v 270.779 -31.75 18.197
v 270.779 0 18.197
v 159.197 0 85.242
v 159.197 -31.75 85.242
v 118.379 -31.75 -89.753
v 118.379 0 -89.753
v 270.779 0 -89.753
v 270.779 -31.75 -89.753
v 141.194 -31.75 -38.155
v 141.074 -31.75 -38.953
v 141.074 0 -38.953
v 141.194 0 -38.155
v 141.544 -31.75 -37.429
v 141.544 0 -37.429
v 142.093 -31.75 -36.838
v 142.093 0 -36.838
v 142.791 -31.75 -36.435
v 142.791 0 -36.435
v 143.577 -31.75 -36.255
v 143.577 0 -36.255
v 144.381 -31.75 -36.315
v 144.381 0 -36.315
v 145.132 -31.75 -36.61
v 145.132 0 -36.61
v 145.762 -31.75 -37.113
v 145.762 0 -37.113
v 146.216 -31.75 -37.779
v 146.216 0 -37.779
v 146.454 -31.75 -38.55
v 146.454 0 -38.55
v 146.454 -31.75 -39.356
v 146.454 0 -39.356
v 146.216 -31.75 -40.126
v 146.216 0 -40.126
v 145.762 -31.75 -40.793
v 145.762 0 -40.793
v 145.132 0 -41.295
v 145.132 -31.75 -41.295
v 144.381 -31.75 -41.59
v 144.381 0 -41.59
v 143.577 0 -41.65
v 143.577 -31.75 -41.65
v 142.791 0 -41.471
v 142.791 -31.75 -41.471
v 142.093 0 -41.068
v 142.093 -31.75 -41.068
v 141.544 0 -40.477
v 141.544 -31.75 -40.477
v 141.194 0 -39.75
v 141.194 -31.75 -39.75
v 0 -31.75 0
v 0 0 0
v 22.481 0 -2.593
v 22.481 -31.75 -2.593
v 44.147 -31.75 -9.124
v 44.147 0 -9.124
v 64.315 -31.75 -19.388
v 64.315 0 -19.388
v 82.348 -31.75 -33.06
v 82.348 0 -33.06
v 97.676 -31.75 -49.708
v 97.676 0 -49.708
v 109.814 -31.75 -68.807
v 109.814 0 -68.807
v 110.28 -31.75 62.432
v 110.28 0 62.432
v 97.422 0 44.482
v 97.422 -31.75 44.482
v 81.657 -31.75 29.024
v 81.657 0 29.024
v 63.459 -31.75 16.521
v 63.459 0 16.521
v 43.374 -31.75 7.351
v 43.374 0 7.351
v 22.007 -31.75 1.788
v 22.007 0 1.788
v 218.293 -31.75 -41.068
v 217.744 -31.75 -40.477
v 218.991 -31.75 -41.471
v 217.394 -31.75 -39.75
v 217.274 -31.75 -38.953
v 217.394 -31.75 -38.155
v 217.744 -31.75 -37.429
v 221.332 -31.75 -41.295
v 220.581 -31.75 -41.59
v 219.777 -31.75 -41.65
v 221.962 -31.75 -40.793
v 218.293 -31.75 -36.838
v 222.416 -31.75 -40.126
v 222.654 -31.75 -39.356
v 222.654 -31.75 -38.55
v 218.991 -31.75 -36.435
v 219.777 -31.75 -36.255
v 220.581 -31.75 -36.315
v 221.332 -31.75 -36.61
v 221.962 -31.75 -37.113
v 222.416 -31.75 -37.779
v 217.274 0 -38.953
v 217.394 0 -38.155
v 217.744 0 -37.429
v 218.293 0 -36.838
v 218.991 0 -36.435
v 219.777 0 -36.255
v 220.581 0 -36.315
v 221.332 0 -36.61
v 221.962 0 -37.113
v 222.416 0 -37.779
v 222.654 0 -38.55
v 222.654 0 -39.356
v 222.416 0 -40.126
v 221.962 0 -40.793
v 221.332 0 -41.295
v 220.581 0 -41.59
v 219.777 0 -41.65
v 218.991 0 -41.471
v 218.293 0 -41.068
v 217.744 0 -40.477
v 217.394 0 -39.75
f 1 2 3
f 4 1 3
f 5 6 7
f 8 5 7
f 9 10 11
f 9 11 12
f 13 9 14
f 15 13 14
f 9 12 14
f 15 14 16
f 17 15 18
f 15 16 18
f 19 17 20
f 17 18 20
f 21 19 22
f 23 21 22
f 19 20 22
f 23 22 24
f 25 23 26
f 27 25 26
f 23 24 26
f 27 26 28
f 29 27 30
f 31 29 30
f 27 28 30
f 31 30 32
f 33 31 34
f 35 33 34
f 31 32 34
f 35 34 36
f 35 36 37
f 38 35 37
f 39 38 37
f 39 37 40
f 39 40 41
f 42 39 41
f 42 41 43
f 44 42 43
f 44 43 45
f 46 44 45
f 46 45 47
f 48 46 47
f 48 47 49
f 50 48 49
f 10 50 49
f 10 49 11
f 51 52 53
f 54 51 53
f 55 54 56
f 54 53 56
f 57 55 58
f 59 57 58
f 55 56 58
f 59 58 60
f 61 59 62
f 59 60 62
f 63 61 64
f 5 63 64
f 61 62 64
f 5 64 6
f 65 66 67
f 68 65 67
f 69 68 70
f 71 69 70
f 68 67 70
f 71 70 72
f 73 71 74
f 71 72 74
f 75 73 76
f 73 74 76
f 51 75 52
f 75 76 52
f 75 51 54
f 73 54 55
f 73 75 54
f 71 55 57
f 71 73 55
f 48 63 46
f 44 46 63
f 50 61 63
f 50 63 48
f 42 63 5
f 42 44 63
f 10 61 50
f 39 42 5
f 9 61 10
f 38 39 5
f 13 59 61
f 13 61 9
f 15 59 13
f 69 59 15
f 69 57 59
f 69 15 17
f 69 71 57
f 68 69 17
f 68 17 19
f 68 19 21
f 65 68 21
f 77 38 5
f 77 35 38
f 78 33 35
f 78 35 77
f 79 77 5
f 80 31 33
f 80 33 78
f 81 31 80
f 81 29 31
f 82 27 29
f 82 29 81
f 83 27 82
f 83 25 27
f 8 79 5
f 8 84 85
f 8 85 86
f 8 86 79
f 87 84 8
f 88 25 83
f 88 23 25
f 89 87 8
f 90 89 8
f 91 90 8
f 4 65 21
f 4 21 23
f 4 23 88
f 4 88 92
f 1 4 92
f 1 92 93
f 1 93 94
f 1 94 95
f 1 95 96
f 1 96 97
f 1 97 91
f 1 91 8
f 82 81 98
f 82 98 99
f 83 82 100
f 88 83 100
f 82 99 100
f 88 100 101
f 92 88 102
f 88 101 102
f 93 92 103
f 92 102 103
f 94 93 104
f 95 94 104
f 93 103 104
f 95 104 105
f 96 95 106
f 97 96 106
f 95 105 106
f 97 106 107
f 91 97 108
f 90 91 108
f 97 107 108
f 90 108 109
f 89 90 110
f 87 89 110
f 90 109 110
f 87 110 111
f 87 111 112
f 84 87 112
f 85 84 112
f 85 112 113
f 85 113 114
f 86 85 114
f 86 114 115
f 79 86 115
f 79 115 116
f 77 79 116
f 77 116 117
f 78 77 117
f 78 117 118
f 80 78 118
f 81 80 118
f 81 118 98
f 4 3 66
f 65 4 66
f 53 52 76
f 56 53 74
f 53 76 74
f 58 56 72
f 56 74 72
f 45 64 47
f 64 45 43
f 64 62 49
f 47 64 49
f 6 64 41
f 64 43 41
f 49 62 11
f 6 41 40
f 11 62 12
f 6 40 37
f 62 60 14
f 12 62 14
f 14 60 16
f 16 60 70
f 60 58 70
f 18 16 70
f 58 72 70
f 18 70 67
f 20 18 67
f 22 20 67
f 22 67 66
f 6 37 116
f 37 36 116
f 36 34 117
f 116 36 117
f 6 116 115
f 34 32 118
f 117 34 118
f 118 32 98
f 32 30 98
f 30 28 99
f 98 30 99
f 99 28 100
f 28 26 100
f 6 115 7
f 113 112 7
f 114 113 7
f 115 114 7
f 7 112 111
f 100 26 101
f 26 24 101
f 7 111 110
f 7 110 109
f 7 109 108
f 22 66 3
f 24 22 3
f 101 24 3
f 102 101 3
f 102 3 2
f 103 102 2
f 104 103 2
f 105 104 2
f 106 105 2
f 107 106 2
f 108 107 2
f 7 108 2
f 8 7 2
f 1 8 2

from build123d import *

# Parameters (mm, degrees)
F1_DEPTH = 31.75
F3_D     = 5.4102


with BuildPart() as f1:
    # F0 (on Front) → F1 (new body)
    with BuildSketch(Plane.XZ):
        with BuildLine():
            Line((159.1974866311, 85.2424), (110.2795238258, 62.4315793225))
            ThreePointArc((110.2795238258, 62.4315793225), (63.4585527357, 16.521426637), (0, 0))
            ThreePointArc((0, 0), (73.6360318528, -25.8222553056), (118.37924, -89.7526814014))
            Line((118.37924, -89.7526814014), (270.77924, -89.7526814014))
            Line((270.77924, -89.7526814014), (270.77924, 18.1973185986))
            Line((270.77924, 18.1973185986), (159.1974866311, 85.2424))
        make_face()
    extrude(amount=F1_DEPTH)

    # F3 (through all)
    with Locations(Plane.XZ.offset(31.75)):
        with Locations((143.77924, -38.9526814014), (219.97924, -38.9526814014)):
            Hole(F3_D / 2)


solid = f1.part
